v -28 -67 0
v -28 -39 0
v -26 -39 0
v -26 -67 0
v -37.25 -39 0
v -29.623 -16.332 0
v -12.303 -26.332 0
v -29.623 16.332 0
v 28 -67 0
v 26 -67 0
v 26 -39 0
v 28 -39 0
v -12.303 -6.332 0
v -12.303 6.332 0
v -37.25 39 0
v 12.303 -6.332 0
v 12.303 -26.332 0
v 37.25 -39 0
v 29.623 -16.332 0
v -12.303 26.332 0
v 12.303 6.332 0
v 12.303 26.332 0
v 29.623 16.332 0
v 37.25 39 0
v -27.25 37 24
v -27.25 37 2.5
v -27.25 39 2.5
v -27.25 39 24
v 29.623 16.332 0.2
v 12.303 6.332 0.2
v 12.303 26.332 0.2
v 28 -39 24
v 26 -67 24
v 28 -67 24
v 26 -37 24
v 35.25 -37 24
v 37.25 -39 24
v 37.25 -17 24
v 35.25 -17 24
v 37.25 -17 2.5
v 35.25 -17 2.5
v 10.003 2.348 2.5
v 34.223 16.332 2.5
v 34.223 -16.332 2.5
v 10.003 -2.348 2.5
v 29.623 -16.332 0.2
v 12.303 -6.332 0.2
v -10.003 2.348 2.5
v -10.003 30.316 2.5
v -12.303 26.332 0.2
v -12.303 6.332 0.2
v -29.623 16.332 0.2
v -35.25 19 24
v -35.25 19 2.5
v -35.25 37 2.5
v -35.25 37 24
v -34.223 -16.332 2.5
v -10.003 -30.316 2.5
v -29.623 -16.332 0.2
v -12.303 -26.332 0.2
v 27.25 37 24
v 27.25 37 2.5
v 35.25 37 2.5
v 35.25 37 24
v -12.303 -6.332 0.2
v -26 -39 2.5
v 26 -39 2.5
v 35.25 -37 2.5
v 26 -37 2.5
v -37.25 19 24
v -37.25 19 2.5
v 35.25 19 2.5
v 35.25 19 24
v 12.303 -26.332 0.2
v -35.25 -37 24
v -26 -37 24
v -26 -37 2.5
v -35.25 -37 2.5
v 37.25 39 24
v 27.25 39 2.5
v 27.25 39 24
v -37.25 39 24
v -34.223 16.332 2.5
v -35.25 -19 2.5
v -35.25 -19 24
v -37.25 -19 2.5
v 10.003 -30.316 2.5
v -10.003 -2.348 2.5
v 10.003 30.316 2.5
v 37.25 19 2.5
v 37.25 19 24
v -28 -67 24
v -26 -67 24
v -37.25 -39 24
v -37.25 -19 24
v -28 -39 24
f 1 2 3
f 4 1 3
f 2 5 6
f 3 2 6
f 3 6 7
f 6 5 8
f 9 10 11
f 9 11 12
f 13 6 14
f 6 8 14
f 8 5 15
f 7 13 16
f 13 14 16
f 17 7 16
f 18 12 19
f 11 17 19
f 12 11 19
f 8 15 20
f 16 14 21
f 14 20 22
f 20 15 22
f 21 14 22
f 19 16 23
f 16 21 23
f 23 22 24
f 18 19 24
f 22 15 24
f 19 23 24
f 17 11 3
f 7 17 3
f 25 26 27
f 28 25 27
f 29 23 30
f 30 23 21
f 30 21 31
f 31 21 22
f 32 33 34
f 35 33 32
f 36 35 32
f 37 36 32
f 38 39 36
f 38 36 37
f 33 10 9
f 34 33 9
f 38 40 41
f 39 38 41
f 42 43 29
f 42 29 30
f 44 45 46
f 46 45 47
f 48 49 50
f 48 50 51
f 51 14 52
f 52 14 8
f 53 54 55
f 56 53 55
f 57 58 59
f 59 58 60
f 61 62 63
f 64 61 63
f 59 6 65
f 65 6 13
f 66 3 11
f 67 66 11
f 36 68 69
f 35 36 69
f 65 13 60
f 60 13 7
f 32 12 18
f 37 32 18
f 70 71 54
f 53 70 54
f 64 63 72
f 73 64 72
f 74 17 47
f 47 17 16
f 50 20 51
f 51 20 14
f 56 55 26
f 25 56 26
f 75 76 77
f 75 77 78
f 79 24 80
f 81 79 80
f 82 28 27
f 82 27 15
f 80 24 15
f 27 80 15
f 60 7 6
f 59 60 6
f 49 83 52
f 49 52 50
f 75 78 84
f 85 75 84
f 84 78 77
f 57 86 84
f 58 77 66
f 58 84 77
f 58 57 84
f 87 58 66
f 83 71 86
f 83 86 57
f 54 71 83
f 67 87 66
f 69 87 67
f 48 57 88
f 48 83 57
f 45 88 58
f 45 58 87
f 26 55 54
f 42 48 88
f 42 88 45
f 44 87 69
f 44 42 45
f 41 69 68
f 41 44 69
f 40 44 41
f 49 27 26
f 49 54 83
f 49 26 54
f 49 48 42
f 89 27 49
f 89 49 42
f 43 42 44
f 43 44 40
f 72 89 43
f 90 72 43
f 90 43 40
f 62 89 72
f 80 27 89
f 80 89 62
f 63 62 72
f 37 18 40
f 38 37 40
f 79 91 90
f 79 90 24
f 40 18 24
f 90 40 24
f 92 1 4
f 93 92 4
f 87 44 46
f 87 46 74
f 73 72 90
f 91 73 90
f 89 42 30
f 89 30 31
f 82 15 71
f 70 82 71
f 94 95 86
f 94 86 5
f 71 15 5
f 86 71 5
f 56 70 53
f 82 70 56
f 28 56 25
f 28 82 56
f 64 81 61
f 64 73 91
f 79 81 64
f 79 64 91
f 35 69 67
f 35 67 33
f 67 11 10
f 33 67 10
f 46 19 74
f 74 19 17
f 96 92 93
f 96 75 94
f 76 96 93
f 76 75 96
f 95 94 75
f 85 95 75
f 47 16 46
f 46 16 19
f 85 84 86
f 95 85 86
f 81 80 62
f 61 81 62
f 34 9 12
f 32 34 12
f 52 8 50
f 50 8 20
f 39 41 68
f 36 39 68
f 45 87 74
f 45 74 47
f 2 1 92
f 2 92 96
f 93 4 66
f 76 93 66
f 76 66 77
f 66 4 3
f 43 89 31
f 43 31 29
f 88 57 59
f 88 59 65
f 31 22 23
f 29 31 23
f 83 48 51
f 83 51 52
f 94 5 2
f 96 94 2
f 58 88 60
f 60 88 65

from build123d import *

# Parameters (mm, degrees)
F0_W     = 26
F0_H     = 2
F0_W_2   = 27.25
F0_W_3   = 2
F0_H_2   = 36
F0_H_3   = 38
F1_DEPTH = 2.5
F2_SIZE  = 2.3
F0_H_4   = 28
F3_DEPTH = 24


with BuildPart() as f1:
    # F0 (on Top) → F1 (new body)
    with BuildSketch(Plane.XY):
        Polygon((0, 37), (0, -37), (26, -37), (35.25, -37), (35.25, -17), (35.25, 19), (35.25, 37), (27.25, 37), align=None)
        Polygon((12.302681016, -26.3321439177), (12.302681016, -6.3321439177), (29.6231890917, -16.3321439177), align=None, mode=Mode.SUBTRACT)
        Polygon((12.302681016, 26.3321439177), (29.6231890917, 16.3321439177), (12.302681016, 6.3321439177), align=None, mode=Mode.SUBTRACT)
        Polygon((-35.25, 19), (-35.25, -19), (-35.25, -37), (-26, -37), (0, -37), (0, 37), (-27.25, 37), (-35.25, 37), align=None)
        Polygon((-12.302681016, -26.3321439177), (-29.6231890917, -16.3321439177), (-12.302681016, -6.3321439177), align=None, mode=Mode.SUBTRACT)
        Polygon((-12.302681016, 26.3321439177), (-12.302681016, 6.3321439177), (-29.6231890917, 16.3321439177), align=None, mode=Mode.SUBTRACT)
        with Locations((-13, -38)):
            Rectangle(F0_W, F0_H)
        with Locations((13, -38)):
            Rectangle(F0_W, F0_H)
        with Locations((-13.625, 38)):
            Rectangle(F0_W_2, F0_H)
        with Locations((13.625, 38)):
            Rectangle(F0_W_2, F0_H)
        with Locations((36.25, 1)):
            Rectangle(F0_W_3, F0_H_2)
        with Locations((-36.25, 0)):
            Rectangle(F0_W_3, F0_H_3)
    extrude(amount=F1_DEPTH)

    # F2
    f2_edges = [f1.edges().sort_by_distance(p)[0] for p in [
        (-20.962935, -11.332144, 2.5),
        (-20.962935, -21.332144, 2.5),
        (-12.302681, -16.332144, 2.5),
        (20.962935, -11.332144, 2.5),
        (12.302681, -16.332144, 2.5),
        (20.962935, -21.332144, 2.5),
        (20.962935, 21.332144, 2.5),
        (12.302681, 16.332144, 2.5),
        (20.962935, 11.332144, 2.5),
        (-20.962935, 21.332144, 2.5),
        (-20.962935, 11.332144, 2.5),
        (-12.302681, 16.332144, 2.5),
    ]]
    chamfer(f2_edges, length=F2_SIZE)

    # F0 (on Top) → F3 (join)
    with BuildSketch(Plane.XY):
        Polygon((-37.25, 39), (-37.25, 19), (-35.25, 19), (-35.25, 37), (-27.25, 37), (-27.25, 39), align=None)
        Polygon((27.25, 39), (27.25, 37), (35.25, 37), (35.25, 19), (37.25, 19), (37.25, 39), align=None)
        Polygon((26, -37), (26, -39), (28, -39), (37.25, -39), (37.25, -17), (35.25, -17), (35.25, -37), align=None)
        Polygon((-37.25, -19), (-37.25, -39), (-28, -39), (-26, -39), (-26, -37), (-35.25, -37), (-35.25, -19), align=None)
        with Locations((27, -53)):
            Rectangle(F0_W_3, F0_H_4)
        with Locations((-27, -53)):
            Rectangle(F0_W_3, F0_H_4)
    extrude(amount=F3_DEPTH)


solid = f1.part
